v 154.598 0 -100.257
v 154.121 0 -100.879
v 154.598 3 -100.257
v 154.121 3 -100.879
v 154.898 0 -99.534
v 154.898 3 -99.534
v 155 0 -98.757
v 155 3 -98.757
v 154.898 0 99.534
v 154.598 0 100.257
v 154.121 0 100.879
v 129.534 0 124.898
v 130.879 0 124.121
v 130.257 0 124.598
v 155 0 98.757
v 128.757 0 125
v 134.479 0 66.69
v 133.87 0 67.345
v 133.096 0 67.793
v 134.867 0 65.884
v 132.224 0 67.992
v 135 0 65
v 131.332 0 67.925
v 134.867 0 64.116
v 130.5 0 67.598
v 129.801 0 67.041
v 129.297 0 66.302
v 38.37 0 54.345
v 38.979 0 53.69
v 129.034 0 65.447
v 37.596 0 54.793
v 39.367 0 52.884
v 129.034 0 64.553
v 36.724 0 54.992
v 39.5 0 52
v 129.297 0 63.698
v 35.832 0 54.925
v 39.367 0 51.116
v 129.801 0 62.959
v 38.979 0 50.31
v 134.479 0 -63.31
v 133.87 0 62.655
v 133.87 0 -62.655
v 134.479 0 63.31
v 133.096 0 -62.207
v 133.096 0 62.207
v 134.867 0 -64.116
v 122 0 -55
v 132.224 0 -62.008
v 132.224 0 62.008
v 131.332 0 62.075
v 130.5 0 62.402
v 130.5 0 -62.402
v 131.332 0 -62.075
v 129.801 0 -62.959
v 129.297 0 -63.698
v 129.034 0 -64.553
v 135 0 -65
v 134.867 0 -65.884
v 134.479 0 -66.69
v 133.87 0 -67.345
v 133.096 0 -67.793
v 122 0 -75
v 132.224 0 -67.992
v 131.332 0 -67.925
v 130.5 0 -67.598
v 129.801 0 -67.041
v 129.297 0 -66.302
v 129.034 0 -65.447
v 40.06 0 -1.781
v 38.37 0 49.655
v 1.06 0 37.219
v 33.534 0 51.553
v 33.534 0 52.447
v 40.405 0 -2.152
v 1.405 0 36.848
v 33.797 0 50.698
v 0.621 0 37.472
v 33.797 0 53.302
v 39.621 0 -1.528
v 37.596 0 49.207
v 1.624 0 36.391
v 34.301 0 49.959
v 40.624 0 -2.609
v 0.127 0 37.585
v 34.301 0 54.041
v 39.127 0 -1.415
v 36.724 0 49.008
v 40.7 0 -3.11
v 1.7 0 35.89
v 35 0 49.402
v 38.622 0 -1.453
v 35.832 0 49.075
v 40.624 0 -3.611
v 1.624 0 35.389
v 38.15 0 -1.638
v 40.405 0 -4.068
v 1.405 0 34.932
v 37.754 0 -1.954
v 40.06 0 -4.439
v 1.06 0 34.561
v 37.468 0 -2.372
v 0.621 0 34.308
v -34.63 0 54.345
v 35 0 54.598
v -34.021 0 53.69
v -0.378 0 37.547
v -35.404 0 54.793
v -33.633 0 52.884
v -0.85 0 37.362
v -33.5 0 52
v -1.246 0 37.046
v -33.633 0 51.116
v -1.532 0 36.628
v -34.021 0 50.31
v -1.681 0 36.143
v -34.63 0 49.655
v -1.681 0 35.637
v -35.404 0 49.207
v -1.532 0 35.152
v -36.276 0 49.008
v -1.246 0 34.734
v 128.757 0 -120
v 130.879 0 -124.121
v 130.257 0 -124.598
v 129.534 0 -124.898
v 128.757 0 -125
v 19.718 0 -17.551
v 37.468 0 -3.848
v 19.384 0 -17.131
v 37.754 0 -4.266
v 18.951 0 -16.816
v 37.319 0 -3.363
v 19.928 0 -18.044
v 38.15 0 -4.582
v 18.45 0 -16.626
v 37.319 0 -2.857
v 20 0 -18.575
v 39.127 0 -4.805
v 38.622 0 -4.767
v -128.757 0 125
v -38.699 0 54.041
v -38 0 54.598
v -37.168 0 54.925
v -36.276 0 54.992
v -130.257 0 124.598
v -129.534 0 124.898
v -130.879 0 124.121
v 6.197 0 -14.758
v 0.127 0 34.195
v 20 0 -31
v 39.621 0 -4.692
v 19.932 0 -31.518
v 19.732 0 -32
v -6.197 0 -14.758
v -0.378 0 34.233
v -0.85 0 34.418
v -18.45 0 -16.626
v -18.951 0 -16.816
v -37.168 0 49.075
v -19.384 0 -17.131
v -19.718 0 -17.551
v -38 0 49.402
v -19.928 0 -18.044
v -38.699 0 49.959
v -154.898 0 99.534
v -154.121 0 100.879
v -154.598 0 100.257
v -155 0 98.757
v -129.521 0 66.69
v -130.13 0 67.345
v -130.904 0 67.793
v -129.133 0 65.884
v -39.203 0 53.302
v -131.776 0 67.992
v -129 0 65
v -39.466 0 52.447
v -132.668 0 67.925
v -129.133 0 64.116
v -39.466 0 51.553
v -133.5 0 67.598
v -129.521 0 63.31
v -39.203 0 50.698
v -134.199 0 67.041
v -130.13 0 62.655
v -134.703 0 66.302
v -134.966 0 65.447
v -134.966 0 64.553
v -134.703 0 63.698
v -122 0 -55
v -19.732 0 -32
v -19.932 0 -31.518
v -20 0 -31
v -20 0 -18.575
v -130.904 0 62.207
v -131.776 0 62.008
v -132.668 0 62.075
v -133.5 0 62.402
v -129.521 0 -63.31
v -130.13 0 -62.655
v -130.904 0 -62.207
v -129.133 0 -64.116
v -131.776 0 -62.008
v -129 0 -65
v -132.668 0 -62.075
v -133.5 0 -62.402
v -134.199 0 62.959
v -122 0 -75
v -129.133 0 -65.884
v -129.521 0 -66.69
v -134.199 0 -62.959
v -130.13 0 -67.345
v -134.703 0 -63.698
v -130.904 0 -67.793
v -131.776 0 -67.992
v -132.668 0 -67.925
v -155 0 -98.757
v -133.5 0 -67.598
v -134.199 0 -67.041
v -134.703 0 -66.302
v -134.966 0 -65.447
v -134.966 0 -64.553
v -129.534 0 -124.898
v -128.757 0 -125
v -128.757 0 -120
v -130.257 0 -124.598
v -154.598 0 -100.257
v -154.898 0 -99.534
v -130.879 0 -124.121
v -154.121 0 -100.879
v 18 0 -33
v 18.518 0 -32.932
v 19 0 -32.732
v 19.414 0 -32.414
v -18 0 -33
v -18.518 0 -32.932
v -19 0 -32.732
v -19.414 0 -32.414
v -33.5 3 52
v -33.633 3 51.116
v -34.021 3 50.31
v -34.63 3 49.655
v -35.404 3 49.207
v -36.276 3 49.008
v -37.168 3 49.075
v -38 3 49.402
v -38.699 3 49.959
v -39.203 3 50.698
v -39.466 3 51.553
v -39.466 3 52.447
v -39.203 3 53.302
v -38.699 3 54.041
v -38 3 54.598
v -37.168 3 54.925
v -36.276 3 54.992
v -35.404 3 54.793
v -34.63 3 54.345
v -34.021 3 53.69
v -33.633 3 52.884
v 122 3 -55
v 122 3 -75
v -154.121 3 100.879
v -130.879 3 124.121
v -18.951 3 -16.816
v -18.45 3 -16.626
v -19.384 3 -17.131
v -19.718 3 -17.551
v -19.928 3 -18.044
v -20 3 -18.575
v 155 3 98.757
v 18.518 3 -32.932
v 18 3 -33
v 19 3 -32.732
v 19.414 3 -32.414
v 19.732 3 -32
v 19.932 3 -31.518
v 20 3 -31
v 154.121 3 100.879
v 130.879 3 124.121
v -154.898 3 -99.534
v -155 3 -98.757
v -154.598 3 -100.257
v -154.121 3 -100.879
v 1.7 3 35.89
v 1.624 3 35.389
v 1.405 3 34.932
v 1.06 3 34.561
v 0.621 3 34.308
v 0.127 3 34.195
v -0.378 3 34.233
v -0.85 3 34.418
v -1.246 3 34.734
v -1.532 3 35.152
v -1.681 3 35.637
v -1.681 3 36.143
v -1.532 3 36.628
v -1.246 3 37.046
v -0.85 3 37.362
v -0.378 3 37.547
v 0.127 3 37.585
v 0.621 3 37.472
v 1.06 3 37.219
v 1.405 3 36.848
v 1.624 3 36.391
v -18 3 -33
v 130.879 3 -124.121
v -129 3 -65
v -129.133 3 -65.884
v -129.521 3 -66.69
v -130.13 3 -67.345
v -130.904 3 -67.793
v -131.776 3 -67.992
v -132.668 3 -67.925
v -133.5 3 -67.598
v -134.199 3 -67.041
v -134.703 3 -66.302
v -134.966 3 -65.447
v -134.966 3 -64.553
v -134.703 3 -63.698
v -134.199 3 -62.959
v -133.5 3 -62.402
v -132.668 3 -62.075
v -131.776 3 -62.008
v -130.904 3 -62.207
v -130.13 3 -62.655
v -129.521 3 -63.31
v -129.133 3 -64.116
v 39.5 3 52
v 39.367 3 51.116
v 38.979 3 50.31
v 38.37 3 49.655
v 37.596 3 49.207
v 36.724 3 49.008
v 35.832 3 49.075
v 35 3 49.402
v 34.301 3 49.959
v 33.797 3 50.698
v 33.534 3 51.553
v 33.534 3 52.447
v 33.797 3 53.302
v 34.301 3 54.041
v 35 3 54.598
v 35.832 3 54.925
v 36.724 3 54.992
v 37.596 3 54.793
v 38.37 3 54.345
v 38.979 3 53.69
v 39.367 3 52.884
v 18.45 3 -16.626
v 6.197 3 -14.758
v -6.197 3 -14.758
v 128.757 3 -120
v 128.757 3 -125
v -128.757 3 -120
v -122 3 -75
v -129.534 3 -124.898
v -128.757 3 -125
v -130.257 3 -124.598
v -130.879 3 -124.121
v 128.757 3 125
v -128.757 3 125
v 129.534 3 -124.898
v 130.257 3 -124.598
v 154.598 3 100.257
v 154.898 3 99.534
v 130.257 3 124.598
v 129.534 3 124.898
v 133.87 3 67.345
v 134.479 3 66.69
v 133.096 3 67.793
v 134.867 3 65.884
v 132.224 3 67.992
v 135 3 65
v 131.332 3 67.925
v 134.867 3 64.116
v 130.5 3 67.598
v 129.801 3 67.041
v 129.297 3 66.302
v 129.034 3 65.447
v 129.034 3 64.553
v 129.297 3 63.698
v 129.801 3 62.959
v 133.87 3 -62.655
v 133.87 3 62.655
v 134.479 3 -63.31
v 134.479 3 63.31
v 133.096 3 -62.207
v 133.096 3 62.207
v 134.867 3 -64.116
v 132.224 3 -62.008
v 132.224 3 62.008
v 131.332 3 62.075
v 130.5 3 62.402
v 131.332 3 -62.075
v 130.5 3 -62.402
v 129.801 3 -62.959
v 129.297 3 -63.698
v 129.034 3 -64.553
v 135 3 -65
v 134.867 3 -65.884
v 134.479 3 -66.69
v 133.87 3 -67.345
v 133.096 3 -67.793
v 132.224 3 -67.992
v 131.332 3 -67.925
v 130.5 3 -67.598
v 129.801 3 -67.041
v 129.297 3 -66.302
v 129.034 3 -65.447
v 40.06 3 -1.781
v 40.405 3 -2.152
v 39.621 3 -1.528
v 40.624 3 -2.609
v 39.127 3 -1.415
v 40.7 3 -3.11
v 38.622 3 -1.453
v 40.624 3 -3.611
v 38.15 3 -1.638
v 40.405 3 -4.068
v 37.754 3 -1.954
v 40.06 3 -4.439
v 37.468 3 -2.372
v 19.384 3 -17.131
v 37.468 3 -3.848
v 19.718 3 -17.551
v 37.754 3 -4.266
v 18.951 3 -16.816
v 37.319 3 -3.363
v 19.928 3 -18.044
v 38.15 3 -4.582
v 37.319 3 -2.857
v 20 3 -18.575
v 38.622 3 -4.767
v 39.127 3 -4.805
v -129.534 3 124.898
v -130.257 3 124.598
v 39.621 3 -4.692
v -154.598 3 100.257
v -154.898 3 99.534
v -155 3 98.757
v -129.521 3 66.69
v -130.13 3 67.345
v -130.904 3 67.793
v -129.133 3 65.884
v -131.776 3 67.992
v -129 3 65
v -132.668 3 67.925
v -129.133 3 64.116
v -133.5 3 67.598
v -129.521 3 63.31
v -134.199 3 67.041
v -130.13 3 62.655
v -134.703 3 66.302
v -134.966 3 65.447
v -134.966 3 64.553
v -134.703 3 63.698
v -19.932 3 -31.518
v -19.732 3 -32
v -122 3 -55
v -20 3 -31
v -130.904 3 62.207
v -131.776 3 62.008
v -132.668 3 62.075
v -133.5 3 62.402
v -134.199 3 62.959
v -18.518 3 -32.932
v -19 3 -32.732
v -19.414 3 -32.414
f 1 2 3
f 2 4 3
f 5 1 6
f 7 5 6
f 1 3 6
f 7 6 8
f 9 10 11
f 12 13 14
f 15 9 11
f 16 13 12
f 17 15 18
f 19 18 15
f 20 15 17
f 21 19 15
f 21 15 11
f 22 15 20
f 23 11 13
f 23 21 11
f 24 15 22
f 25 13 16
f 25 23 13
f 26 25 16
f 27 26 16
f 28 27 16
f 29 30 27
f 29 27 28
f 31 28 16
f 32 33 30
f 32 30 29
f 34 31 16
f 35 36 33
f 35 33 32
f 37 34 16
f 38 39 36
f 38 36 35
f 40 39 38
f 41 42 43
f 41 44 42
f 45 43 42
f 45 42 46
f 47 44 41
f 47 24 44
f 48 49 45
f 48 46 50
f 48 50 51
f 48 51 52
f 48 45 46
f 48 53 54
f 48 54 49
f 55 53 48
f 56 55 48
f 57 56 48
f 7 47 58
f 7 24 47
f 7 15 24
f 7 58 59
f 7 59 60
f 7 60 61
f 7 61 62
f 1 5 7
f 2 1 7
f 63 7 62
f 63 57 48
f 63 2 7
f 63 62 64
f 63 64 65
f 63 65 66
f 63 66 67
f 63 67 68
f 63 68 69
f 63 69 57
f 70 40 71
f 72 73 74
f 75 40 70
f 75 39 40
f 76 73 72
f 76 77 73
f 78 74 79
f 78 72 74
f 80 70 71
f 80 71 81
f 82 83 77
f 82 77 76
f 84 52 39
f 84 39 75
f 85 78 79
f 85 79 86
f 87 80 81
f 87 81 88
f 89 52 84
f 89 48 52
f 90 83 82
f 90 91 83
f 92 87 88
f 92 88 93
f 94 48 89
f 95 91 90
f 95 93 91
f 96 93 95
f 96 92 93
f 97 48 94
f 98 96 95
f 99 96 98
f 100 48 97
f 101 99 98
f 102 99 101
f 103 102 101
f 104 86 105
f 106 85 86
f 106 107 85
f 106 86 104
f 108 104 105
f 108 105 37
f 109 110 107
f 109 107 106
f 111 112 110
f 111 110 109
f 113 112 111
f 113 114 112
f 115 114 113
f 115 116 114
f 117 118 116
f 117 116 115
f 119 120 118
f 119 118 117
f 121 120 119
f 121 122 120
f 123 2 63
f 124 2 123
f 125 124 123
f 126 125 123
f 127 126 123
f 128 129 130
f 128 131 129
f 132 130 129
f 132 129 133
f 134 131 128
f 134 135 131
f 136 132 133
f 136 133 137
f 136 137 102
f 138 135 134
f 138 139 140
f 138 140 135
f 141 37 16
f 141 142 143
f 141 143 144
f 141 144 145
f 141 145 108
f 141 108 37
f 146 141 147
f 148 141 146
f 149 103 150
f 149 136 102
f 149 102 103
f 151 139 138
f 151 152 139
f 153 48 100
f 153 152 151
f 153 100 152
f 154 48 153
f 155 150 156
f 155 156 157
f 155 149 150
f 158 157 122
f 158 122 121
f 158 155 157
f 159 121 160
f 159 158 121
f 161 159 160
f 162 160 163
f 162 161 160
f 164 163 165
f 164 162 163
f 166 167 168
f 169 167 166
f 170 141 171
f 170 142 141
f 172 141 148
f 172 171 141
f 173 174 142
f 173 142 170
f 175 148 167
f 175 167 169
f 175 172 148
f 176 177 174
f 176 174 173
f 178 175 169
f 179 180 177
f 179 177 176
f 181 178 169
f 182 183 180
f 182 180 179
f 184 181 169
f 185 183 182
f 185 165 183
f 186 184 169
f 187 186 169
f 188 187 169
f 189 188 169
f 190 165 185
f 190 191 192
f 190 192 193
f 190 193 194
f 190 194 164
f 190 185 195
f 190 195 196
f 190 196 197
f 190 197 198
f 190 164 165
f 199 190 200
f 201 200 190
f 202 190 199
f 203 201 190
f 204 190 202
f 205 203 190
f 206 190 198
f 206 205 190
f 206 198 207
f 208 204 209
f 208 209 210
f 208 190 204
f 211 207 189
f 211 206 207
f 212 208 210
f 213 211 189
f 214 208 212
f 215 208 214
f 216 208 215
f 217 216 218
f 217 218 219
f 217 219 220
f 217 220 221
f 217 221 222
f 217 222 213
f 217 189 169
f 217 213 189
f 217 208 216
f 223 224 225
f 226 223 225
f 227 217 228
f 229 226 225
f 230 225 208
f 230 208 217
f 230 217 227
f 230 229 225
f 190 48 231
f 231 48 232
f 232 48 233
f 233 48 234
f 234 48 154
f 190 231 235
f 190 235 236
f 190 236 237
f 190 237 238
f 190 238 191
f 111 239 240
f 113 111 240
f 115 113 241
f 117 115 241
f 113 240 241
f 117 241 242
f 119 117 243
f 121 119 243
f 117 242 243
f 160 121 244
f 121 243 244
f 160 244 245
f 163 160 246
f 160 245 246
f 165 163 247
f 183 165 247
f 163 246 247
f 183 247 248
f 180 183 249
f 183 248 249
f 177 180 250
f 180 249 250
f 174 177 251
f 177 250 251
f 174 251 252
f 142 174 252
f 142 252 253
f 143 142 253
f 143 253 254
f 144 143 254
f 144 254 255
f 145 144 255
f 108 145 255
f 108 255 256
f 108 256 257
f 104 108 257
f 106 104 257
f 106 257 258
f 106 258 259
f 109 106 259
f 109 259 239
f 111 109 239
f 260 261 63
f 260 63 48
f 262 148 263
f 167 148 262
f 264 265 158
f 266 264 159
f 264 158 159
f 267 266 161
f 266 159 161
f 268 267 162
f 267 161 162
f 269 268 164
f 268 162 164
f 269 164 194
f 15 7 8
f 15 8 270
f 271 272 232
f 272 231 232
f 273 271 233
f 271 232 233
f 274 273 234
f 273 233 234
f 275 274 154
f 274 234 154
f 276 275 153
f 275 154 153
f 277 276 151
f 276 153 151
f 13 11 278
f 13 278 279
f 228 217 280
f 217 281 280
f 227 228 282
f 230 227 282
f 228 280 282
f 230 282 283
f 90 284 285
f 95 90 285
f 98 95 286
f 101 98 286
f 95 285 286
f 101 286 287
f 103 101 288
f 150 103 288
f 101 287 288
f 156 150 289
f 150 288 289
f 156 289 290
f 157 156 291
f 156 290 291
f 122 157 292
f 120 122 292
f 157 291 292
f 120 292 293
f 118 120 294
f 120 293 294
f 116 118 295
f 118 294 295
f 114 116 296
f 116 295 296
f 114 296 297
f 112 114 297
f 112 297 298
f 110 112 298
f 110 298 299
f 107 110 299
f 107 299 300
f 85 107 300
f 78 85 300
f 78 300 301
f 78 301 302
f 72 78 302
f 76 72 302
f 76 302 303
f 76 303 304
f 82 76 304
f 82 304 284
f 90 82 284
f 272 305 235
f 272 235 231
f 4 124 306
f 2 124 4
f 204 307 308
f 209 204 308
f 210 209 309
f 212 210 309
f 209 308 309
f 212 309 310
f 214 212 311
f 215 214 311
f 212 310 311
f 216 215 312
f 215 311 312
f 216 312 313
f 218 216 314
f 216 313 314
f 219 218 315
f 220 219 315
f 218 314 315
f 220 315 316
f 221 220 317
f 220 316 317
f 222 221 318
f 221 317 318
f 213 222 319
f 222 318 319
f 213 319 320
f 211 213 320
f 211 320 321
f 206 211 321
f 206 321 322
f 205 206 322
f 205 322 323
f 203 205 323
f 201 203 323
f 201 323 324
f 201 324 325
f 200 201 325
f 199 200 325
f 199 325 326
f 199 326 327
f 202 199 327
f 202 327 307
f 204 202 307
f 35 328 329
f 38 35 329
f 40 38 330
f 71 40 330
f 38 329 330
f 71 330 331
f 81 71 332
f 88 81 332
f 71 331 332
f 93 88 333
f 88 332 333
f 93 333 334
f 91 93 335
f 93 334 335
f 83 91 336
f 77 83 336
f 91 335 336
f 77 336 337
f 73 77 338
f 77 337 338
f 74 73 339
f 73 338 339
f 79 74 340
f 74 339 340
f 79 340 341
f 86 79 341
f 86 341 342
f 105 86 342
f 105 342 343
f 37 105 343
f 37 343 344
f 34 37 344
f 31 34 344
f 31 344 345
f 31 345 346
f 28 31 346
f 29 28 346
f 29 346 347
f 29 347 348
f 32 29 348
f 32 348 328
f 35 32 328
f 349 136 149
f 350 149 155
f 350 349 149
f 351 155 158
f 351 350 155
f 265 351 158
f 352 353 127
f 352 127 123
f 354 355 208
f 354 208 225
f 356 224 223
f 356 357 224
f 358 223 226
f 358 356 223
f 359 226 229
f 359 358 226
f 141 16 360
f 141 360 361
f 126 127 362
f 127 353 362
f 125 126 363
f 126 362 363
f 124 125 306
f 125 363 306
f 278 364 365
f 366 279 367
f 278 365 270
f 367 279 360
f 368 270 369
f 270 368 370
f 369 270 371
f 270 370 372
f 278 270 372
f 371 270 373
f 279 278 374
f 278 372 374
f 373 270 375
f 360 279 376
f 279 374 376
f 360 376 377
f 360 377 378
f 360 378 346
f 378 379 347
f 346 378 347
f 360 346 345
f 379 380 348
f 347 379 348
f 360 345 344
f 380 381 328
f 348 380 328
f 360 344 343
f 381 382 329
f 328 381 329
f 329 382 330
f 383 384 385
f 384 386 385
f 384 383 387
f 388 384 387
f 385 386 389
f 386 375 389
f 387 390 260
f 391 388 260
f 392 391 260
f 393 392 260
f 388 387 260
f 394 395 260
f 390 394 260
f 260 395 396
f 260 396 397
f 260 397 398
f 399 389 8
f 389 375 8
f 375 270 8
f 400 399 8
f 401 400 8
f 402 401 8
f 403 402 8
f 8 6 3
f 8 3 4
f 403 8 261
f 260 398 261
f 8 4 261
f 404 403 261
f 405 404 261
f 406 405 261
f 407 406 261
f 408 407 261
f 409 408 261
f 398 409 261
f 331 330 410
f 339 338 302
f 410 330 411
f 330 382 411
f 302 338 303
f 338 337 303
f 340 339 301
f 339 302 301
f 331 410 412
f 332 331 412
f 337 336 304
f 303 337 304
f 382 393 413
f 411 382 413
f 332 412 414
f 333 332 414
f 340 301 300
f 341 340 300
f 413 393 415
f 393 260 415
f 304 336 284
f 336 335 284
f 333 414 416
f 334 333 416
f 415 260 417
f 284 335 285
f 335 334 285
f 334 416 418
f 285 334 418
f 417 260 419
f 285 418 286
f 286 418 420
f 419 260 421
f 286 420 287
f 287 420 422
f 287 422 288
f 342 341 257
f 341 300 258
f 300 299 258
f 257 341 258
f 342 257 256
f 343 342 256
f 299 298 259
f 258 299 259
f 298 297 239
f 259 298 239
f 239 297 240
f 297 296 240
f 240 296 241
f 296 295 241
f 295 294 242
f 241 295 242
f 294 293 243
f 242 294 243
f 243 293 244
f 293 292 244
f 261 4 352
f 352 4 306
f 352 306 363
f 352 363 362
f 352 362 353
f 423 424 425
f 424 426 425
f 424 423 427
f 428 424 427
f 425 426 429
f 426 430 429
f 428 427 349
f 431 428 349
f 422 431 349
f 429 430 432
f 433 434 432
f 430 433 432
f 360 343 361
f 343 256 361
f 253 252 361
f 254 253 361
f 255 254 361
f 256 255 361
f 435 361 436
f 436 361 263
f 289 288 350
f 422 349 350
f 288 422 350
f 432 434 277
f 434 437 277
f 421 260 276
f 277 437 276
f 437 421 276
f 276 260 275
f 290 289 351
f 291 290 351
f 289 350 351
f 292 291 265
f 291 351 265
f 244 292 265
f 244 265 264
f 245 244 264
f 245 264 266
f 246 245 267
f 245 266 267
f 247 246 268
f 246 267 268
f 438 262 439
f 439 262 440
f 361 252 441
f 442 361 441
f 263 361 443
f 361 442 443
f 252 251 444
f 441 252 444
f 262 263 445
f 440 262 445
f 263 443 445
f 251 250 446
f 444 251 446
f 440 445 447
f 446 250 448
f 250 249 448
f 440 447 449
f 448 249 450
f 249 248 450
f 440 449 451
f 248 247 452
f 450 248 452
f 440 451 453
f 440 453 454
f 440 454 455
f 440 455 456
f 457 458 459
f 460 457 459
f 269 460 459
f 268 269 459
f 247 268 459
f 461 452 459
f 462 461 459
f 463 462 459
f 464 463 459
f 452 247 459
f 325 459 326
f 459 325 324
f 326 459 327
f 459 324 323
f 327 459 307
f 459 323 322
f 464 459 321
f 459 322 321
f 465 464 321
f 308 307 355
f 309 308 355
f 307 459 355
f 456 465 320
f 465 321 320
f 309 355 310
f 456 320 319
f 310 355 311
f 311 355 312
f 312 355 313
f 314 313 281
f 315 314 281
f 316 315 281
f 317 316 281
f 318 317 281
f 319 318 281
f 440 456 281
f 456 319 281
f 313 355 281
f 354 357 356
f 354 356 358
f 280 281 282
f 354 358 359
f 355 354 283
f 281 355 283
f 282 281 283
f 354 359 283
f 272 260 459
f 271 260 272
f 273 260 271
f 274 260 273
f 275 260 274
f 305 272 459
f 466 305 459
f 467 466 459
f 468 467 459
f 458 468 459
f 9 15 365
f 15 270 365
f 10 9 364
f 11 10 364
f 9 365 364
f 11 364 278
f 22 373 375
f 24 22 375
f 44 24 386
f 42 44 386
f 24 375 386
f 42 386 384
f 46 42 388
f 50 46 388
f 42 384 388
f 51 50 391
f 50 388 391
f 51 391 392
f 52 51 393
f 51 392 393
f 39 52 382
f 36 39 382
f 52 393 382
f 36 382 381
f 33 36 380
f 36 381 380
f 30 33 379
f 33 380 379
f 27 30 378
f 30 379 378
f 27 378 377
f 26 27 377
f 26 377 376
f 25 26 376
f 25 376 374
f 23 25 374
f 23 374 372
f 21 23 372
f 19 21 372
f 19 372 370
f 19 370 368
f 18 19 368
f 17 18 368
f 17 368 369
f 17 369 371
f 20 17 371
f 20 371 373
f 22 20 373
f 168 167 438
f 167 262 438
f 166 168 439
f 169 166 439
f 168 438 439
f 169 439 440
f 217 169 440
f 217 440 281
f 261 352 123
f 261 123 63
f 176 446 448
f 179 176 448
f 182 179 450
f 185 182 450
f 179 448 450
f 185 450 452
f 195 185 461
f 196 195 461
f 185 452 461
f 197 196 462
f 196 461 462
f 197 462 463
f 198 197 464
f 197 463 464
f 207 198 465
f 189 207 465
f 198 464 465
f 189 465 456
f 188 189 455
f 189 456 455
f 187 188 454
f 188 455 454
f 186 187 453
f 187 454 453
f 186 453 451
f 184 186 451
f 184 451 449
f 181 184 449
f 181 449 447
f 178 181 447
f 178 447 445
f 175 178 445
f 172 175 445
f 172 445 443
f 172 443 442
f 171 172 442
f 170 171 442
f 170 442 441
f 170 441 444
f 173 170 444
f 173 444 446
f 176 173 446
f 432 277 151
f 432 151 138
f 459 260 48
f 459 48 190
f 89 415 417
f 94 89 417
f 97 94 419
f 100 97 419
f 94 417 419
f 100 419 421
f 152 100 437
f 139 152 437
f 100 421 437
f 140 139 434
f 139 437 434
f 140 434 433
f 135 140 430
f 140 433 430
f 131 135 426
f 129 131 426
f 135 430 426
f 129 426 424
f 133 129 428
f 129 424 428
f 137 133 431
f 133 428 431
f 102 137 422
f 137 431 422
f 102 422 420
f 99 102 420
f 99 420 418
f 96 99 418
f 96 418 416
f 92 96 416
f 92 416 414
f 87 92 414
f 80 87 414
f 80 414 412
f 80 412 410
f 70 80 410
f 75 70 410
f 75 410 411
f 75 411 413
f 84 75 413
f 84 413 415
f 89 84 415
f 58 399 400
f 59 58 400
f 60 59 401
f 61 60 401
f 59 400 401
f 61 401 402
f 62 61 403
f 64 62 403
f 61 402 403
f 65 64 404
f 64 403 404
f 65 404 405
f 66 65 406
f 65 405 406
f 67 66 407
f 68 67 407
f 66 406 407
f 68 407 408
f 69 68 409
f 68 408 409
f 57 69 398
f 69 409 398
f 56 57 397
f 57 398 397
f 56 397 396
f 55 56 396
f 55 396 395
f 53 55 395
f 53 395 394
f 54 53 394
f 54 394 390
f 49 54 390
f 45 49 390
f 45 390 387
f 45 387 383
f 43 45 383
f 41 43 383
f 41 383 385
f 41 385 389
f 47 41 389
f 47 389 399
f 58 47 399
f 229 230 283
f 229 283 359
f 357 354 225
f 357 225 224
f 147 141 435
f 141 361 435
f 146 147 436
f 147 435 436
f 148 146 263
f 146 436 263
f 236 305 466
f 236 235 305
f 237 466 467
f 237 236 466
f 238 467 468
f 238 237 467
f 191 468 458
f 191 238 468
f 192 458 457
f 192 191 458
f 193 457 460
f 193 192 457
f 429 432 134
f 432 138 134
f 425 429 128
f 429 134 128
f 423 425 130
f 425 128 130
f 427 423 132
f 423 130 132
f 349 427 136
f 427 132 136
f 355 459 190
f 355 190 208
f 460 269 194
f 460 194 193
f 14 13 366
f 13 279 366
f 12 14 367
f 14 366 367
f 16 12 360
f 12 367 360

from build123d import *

# Parameters (mm, degrees)
BOSS_EXTRU_1_DEPTH      = 3
CONG_1_R                = 3
ESQUISSE2_R             = 3
PER_AGE_PROFIL_DEPTH    = 4
ESQUISSE3_R             = 3
ENL_V_MAT_EXTRU_1_DEPTH = 4
ENL_V_MAT_EXTRU_3_REACH = 5
ESQUISSE5_R             = 1.7
ENL_V_MAT_EXTRU_4_REACH = 5
CONG_2_R                = 2
ENL_V_MAT_EXTRU_2_REACH = 5


with BuildPart() as part:
    # Esquisse1 → Boss.-Extru.1 (new body)
    with BuildSketch(Plane(origin=(0, 0, 0), x_dir=(1, 0, 0), z_dir=(0, 1, 0))):
        Polygon((-130, 125), (130, 125), (155, 100), (155, -100), (130, -125), (-130, -125), (-155, -100), (-155, 100), align=None)
    extrude(amount=BOSS_EXTRU_1_DEPTH)

    # Congé1
    cong_1_edges = [part.edges().sort_by_distance(p)[0] for p in [
        (155, 1.5, -100),
        (155, 1.5, 100),
        (130, 1.5, 125),
        (-130, 1.5, 125),
        (-155, 1.5, 100),
        (-155, 1.5, -100),
        (-130, 1.5, -125),
        (130, 1.5, -125),
    ]]
    fillet(cong_1_edges, radius=CONG_1_R)

    # Esquisse2 → Perçage Profilé (cut, through all)
    with BuildSketch(Plane(origin=(0, 3, 0), x_dir=(1, 0, 0), z_dir=(0, 1, 0))):
        with Locations((-132, 65)):
            Circle(ESQUISSE2_R)
        with Locations((-132, -65)):
            Circle(ESQUISSE2_R)
        with Locations((132, -65)):
            Circle(ESQUISSE2_R)
        with Locations((132, 65)):
            Circle(ESQUISSE2_R)
    extrude(amount=-PER_AGE_PROFIL_DEPTH, mode=Mode.SUBTRACT)

    # Esquisse3 → Enlèv. mat.-Extru.1 (cut, through all)
    with BuildSketch(Plane(origin=(0, 3, 0), x_dir=(1, 0, 0), z_dir=(0, 1, 0))):
        with Locations((-36.5, -52)):
            Circle(ESQUISSE3_R)
        with Locations((36.5, -52)):
            Circle(ESQUISSE3_R)
    extrude(amount=-ENL_V_MAT_EXTRU_1_DEPTH, mode=Mode.SUBTRACT)

    # Esquisse5 → Enlèv. mat.-Extru.3 (cut, up to next)
    with BuildSketch(Plane(origin=(0, 3, 0), x_dir=(1, 0, 0), z_dir=(0, 1, 0)), mode=Mode.PRIVATE) as enl_v_mat_extru_3_sk1:
        with Locations((0, -35.89)):
            Circle(ESQUISSE5_R)
    enl_v_mat_extru_3_tool1 = extrude(enl_v_mat_extru_3_sk1.sketch, amount=-ENL_V_MAT_EXTRU_3_REACH, mode=Mode.PRIVATE) & part.part
    add(enl_v_mat_extru_3_tool1.solids().sort_by_distance((0, 3, 35.89))[0], mode=Mode.SUBTRACT)
    # Esquisse5 → Enlèv. mat.-Extru.3 (cut, up to next)
    with BuildSketch(Plane(origin=(0, 3, 0), x_dir=(1, 0, 0), z_dir=(0, 1, 0)), mode=Mode.PRIVATE) as enl_v_mat_extru_3_sk2:
        with Locations((39, 3.11)):
            Circle(ESQUISSE5_R)
    enl_v_mat_extru_3_tool2 = extrude(enl_v_mat_extru_3_sk2.sketch, amount=-ENL_V_MAT_EXTRU_3_REACH, mode=Mode.PRIVATE) & part.part
    add(enl_v_mat_extru_3_tool2.solids().sort_by_distance((39, 3, -3.11))[0], mode=Mode.SUBTRACT)

    # Esquisse6 → Enlèv. mat.-Extru.4 (cut, up to next)
    with BuildSketch(Plane(origin=(0, 3, 0), x_dir=(1, 0, 0), z_dir=(0, 1, 0)), mode=Mode.PRIVATE) as enl_v_mat_extru_4_sk1:
        with BuildLine():
            Line((-20, 33), (20, 33))
            Line((20, 33), (20, 17))
            ThreePointArc((20, 17), (0, 14.523581408), (-20, 17))
            Line((-20, 17), (-20, 33))
        make_face()
    enl_v_mat_extru_4_tool1 = extrude(enl_v_mat_extru_4_sk1.sketch, amount=-ENL_V_MAT_EXTRU_4_REACH, mode=Mode.PRIVATE) & part.part
    add(enl_v_mat_extru_4_tool1.solids().sort_by_distance((0, 3, -24.156632))[0], mode=Mode.SUBTRACT)

    # Congé2
    cong_2_edges = [part.edges().sort_by_distance(p)[0] for p in [
        (-20, 1.5, -17),
        (-20, 1.5, -33),
        (20, 1.5, -33),
        (20, 1.5, -17),
    ]]
    fillet(cong_2_edges, radius=CONG_2_R)

    # Esquisse4 → Enlèv. mat.-Extru.2 (cut, up to next)
    with BuildSketch(Plane(origin=(0, 3, 0), x_dir=(1, 0, 0), z_dir=(0, 1, 0)), mode=Mode.PRIVATE) as enl_v_mat_extru_2_sk1:
        Polygon((122, 55), (-122, 55), (-122, 75), (-128.757359313, 120), (-128.757359313, 125), (128.757359313, 125), (128.757359313, 120), (122, 75), align=None)
    enl_v_mat_extru_2_tool1 = extrude(enl_v_mat_extru_2_sk1.sketch, amount=-ENL_V_MAT_EXTRU_2_REACH, mode=Mode.PRIVATE) & part.part
    add(enl_v_mat_extru_2_tool1.solids().sort_by_distance((0, 3, -90.387205))[0], mode=Mode.SUBTRACT)


solid = part.part
